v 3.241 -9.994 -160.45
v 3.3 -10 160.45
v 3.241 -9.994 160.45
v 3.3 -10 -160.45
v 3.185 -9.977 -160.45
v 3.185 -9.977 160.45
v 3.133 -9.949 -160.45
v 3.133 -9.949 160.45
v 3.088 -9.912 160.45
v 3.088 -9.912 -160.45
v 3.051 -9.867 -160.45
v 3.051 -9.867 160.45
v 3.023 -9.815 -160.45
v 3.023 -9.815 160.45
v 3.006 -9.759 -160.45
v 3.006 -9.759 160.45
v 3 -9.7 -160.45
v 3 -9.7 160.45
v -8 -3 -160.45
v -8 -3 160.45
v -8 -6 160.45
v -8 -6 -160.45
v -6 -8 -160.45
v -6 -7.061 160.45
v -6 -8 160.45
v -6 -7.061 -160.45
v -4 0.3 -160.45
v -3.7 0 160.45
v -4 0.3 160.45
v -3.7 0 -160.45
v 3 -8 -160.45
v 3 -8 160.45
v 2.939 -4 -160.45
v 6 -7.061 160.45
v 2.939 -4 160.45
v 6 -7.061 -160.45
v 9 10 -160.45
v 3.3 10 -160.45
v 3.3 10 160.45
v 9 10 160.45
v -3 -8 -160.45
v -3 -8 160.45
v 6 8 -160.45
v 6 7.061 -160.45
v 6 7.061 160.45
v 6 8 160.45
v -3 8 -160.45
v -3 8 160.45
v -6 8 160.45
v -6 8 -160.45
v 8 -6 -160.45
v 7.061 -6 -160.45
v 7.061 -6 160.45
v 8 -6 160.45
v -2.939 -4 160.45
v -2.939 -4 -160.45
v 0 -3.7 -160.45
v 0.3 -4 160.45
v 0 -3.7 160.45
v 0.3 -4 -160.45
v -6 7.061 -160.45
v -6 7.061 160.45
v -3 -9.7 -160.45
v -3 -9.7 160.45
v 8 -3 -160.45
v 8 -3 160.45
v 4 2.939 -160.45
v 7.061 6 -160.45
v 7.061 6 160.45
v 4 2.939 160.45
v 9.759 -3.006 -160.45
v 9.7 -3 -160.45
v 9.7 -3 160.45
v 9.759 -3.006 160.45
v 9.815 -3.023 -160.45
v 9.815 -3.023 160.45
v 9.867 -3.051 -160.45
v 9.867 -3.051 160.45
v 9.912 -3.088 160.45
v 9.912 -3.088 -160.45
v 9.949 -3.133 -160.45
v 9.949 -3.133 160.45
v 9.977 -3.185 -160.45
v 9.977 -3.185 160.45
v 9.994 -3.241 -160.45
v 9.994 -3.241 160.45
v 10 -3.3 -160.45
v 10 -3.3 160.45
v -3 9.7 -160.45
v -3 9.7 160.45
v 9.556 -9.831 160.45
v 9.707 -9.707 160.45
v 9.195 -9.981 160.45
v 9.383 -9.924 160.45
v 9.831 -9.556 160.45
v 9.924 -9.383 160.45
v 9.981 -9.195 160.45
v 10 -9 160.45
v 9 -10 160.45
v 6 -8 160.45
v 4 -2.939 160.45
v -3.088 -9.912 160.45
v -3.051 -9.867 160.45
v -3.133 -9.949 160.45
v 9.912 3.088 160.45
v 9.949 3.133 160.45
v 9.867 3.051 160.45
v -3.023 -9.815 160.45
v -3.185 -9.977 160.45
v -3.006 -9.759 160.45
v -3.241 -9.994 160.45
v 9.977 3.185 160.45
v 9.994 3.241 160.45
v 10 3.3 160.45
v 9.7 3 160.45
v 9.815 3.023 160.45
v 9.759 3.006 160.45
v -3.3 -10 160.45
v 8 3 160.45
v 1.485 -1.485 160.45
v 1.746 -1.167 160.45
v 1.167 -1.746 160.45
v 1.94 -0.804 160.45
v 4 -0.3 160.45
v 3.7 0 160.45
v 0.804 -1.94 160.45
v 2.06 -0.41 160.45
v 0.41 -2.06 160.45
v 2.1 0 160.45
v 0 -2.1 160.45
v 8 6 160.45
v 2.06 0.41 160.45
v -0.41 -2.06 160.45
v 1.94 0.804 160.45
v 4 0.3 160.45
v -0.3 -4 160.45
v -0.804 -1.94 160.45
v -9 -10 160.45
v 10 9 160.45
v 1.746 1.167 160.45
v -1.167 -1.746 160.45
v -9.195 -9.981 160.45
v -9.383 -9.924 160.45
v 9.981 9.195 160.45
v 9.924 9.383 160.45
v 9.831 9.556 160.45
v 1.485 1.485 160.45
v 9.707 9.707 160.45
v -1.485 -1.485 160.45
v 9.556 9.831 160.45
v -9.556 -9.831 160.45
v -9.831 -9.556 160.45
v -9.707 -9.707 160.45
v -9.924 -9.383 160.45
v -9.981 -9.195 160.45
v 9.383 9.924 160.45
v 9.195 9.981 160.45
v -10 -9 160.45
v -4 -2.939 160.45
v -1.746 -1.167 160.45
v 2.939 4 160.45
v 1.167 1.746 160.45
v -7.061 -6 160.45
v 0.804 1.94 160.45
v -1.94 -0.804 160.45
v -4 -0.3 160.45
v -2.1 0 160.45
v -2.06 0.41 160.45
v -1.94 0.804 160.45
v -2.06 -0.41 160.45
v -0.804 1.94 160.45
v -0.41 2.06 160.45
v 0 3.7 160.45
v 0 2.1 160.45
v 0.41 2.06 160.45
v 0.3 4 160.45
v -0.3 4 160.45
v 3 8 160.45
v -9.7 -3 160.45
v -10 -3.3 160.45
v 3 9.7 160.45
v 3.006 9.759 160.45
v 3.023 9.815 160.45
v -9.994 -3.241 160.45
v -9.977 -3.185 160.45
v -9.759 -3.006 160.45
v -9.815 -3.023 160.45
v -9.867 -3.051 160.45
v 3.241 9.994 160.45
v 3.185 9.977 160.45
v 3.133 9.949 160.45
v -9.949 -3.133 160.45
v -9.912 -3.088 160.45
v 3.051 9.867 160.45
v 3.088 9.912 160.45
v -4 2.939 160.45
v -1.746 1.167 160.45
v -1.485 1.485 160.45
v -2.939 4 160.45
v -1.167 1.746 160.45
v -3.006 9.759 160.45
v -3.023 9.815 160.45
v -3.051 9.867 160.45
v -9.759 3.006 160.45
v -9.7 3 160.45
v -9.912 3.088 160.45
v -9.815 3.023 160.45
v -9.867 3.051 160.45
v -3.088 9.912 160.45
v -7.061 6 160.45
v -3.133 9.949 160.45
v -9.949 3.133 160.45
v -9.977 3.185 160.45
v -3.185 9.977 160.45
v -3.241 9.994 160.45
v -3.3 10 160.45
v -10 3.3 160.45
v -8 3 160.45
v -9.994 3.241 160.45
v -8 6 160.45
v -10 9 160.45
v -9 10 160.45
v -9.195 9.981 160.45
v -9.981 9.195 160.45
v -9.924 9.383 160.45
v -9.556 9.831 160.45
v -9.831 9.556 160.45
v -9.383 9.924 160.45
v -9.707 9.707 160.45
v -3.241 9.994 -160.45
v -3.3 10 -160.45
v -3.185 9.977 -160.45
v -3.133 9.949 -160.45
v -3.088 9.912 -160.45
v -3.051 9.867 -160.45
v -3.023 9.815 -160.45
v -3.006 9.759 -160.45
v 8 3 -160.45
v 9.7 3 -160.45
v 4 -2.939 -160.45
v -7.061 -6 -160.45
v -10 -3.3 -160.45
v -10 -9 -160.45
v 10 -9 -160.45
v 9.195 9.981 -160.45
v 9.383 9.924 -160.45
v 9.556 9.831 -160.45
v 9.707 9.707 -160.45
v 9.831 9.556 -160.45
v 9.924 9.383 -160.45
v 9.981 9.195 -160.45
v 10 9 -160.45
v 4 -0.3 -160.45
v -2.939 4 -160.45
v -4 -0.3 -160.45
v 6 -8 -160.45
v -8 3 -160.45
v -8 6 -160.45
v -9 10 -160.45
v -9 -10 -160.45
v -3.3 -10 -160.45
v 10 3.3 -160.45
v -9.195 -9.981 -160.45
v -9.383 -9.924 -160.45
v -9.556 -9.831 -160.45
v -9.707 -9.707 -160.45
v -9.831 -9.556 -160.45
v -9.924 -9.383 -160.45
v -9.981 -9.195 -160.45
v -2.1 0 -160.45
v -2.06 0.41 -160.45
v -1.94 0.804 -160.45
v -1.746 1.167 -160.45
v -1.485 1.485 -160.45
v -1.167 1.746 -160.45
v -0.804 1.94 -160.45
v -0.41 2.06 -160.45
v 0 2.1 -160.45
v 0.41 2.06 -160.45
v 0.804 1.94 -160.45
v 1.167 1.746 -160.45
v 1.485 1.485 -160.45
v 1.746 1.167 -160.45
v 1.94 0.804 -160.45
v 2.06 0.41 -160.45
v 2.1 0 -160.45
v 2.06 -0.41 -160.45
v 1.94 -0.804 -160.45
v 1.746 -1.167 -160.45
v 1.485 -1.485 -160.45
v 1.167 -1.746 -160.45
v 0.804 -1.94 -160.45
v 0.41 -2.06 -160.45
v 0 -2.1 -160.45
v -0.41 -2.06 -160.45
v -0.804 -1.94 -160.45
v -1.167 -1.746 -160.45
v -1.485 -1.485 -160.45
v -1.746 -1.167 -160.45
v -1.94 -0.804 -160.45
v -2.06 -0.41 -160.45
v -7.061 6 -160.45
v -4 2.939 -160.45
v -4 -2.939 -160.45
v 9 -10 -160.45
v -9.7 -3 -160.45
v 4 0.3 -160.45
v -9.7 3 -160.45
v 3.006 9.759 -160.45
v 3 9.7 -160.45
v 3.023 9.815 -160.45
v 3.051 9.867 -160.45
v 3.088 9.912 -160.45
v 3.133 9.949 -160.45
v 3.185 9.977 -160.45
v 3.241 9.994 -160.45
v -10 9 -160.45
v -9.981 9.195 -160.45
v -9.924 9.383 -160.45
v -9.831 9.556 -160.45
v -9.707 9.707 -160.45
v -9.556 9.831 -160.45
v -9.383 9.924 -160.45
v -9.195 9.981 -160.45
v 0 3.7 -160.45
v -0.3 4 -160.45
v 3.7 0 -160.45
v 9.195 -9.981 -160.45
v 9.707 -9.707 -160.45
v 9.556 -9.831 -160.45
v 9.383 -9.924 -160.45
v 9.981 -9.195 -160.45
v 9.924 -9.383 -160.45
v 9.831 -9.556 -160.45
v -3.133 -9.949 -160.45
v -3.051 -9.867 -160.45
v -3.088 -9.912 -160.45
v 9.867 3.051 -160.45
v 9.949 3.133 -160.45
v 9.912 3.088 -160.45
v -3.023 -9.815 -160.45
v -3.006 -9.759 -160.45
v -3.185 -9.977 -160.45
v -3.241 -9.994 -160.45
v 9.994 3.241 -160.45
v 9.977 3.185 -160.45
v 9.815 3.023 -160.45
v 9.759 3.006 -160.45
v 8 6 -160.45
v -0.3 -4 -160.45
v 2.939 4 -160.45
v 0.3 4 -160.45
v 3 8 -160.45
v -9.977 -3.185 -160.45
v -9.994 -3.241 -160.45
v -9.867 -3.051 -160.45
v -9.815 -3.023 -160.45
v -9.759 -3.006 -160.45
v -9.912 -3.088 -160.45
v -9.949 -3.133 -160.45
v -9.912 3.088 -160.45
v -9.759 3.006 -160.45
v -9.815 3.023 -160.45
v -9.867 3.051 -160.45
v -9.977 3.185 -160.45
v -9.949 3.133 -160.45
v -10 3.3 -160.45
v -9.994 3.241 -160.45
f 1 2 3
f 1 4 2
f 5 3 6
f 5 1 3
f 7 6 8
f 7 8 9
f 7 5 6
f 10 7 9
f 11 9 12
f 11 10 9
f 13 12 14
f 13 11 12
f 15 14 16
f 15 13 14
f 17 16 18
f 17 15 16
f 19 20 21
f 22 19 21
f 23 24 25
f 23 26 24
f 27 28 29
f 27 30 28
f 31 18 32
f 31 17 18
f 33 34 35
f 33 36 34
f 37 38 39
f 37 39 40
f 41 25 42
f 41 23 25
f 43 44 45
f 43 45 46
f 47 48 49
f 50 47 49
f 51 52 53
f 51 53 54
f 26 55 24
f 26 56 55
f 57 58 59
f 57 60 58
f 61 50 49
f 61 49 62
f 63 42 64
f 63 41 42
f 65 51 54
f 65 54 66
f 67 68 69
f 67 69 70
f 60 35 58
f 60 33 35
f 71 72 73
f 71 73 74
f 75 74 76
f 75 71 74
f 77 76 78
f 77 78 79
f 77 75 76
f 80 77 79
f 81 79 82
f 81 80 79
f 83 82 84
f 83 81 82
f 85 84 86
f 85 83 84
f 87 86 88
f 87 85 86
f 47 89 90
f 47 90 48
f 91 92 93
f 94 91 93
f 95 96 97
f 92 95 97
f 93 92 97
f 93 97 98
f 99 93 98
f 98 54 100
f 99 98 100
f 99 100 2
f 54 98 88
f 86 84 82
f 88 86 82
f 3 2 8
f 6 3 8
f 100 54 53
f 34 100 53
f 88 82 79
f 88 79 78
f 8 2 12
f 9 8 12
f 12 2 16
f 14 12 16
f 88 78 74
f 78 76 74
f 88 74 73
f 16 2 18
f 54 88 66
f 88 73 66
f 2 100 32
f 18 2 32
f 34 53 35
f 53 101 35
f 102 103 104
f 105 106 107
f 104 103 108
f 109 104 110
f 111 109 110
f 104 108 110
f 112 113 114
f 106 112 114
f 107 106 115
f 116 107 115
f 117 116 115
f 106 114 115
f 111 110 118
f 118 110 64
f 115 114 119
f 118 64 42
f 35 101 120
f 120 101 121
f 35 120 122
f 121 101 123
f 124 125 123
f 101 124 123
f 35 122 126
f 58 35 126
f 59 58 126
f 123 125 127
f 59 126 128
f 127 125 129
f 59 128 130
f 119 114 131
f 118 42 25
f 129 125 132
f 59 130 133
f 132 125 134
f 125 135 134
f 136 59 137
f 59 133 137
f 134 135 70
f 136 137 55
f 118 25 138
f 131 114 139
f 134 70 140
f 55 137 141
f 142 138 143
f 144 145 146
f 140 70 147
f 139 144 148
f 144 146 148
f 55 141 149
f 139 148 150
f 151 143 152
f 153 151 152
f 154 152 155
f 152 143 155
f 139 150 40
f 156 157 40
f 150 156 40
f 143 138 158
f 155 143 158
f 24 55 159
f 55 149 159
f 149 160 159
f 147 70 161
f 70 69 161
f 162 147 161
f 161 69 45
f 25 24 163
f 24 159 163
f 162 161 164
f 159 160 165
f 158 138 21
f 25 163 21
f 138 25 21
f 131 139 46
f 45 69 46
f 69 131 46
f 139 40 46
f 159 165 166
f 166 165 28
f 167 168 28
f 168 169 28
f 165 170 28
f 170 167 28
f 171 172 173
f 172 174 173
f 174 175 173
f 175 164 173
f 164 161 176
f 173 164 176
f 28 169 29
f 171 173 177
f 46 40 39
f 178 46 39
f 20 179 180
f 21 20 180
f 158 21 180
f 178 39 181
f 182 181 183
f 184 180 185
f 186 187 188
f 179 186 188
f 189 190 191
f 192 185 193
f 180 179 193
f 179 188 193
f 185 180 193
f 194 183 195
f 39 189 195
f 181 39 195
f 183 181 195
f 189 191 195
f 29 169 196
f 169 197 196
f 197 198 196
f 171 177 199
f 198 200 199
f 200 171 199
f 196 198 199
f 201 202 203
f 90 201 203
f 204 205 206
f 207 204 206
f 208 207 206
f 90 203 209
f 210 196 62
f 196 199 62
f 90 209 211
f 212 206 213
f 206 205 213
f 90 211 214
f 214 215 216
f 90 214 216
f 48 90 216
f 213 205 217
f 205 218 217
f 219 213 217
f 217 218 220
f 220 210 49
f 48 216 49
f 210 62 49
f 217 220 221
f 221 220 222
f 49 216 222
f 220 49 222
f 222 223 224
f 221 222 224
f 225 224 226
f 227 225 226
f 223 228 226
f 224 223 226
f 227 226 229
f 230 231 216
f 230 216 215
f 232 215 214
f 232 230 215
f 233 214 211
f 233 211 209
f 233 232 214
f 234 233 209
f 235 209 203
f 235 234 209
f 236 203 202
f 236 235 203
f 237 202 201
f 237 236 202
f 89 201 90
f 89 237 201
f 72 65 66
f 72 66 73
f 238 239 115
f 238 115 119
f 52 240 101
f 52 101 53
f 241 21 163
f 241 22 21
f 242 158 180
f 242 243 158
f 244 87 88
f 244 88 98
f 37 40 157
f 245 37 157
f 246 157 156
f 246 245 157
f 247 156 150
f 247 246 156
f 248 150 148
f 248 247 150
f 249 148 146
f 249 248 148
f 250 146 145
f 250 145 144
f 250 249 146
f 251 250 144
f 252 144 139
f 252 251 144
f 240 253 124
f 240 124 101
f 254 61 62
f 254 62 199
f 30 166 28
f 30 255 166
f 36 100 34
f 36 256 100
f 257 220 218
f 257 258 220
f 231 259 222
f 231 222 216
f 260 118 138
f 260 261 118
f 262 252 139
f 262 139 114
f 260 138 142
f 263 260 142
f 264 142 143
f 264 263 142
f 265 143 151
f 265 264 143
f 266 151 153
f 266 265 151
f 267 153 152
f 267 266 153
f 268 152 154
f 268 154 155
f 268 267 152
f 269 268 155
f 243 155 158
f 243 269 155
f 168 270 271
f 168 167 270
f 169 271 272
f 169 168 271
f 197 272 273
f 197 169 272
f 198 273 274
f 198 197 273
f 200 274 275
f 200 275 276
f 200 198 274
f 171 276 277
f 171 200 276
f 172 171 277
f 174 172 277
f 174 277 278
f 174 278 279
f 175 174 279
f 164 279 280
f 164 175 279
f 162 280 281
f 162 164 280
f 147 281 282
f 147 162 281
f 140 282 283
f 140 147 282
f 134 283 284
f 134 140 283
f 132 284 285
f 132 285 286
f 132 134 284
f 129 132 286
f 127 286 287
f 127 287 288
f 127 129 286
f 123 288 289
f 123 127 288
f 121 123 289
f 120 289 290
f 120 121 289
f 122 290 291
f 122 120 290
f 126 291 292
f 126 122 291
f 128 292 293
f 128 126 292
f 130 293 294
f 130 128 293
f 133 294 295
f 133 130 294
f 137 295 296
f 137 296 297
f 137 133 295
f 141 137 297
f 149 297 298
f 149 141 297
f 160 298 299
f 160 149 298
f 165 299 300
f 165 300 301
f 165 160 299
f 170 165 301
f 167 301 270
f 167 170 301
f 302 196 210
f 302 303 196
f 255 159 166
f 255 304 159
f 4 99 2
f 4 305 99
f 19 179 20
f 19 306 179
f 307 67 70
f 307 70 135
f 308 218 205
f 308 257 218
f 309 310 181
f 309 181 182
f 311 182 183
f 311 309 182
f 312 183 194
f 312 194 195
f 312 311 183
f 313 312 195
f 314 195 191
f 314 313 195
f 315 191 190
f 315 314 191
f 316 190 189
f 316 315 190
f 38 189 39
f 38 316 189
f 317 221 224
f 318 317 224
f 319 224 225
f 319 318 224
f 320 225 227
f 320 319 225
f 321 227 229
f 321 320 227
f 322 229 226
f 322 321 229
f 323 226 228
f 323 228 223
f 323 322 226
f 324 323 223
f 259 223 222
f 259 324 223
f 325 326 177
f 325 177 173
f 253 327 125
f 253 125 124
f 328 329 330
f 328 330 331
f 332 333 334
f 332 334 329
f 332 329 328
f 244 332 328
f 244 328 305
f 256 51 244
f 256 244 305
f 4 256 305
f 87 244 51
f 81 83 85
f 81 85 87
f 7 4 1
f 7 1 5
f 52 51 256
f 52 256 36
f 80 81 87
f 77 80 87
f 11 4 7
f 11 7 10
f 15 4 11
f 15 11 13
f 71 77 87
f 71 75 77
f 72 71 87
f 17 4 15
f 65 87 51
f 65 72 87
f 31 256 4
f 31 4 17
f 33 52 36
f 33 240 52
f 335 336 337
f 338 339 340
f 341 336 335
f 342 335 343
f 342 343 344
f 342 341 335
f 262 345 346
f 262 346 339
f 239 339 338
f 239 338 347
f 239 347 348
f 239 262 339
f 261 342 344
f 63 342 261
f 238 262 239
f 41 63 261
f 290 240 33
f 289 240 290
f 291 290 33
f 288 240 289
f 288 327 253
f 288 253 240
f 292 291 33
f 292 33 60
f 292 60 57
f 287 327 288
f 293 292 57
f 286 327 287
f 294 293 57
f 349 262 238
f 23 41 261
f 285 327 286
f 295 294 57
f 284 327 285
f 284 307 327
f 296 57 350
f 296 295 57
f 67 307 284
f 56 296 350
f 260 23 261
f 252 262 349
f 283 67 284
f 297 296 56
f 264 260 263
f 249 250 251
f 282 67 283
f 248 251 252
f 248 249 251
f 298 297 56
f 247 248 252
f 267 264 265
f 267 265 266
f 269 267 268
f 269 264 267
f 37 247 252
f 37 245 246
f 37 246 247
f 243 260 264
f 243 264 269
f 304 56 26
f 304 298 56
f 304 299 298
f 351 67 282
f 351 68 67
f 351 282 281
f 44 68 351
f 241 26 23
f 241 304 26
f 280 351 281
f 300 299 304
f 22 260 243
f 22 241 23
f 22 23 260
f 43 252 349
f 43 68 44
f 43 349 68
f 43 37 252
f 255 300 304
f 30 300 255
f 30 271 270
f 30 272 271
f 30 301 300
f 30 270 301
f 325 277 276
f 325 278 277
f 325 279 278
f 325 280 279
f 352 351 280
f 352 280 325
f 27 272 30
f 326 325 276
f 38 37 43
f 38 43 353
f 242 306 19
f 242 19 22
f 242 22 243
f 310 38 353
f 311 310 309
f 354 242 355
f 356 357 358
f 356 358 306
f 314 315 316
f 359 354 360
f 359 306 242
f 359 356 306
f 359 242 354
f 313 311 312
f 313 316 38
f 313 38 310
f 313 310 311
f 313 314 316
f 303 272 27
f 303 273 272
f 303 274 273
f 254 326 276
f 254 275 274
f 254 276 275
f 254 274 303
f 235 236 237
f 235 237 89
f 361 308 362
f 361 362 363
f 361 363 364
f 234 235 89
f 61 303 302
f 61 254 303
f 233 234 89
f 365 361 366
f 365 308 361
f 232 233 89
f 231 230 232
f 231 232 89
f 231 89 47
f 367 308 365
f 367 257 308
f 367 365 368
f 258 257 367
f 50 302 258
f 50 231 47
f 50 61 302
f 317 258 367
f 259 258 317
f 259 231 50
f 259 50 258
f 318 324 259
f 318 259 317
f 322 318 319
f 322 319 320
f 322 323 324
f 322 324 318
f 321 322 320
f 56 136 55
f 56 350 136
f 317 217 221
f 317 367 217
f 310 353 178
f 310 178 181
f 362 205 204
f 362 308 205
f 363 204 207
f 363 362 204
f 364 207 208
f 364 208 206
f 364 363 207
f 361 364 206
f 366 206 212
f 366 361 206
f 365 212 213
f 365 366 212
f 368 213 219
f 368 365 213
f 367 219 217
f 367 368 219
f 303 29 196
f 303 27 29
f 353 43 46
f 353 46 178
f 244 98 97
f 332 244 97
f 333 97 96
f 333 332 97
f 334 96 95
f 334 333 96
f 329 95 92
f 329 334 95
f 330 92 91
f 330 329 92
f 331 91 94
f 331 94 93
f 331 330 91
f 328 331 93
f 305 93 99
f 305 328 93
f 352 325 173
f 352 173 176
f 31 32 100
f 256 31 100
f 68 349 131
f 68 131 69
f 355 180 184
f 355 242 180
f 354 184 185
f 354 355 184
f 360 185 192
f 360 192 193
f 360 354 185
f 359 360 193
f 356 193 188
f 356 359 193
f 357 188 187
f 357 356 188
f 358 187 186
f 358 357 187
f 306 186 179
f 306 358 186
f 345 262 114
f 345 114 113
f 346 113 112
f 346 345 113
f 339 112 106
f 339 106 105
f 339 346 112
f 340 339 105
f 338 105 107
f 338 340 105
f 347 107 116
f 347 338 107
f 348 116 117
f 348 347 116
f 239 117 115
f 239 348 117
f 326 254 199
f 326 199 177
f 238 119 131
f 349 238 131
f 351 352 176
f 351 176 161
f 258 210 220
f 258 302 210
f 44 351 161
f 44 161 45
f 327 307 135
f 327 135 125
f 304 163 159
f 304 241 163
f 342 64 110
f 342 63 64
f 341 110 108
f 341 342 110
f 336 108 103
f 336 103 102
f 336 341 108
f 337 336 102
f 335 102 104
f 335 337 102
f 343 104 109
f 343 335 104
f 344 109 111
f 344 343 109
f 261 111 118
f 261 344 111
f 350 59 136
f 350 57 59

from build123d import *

# Parameters (mm, degrees)
SKETCH1_R           = 2.1
BOSS_EXTRUDE1_DEPTH = 160.45


with BuildPart() as part:
    # Sketch1 → Boss-Extrude1 (new, symmetric)
    with BuildSketch(Plane(origin=(0, 0, 0), x_dir=(-1, 0, 0), z_dir=(0, 0, -1))):
        with BuildLine():
            Line((10, 3.3), (10, 9))
            ThreePointArc((10, 9), (9.707106781, 9.707106781), (9, 10))
            Line((9, 10), (3.3, 10))
            ThreePointArc((3.3, 10), (3.087867966, 9.912132034), (3, 9.7))
            Line((3, 9.7), (3, 8))
            Line((3, 8), (6, 8))
            Line((6, 8), (6, 7.060660172))
            Line((6, 7.060660172), (2.939339828, 4))
            Line((2.939339828, 4), (0.3, 4))
            Line((0.3, 4), (0, 3.7))
            Line((0, 3.7), (-0.3, 4))
            Line((-0.3, 4), (-2.939339828, 4))
            Line((-2.939339828, 4), (-6, 7.060660172))
            Line((-6, 7.060660172), (-6, 8))
            Line((-6, 8), (-3, 8))
            Line((-3, 8), (-3, 9.7))
            ThreePointArc((-3, 9.7), (-3.087867966, 9.912132034), (-3.3, 10))
            Line((-3.3, 10), (-9, 10))
            ThreePointArc((-9, 10), (-9.707106781, 9.707106781), (-10, 9))
            Line((-10, 9), (-10, 3.3))
            ThreePointArc((-10, 3.3), (-9.912132034, 3.087867966), (-9.7, 3))
            Line((-9.7, 3), (-8, 3))
            Line((-8, 3), (-8, 6))
            Line((-8, 6), (-7.060660172, 6))
            Line((-7.060660172, 6), (-4, 2.939339828))
            Line((-4, 2.939339828), (-4, 0.3))
            Line((-4, 0.3), (-3.7, 0))
            Line((-3.7, 0), (-4, -0.3))
            Line((-4, -0.3), (-4, -2.939339828))
            Line((-4, -2.939339828), (-7.060660172, -6))
            Line((-7.060660172, -6), (-8, -6))
            Line((-8, -6), (-8, -3))
            Line((-8, -3), (-9.7, -3))
            ThreePointArc((-9.7, -3), (-9.912132034, -3.087867966), (-10, -3.3))
            Line((-10, -3.3), (-10, -9))
            ThreePointArc((-10, -9), (-9.707106781, -9.707106781), (-9, -10))
            Line((-9, -10), (-3.3, -10))
            ThreePointArc((-3.3, -10), (-3.087867966, -9.912132034), (-3, -9.7))
            Line((-3, -9.7), (-3, -8))
            Line((-3, -8), (-6, -8))
            Line((-6, -8), (-6, -7.060660172))
            Line((-6, -7.060660172), (-2.939339828, -4))
            Line((-2.939339828, -4), (-0.3, -4))
            Line((-0.3, -4), (0, -3.7))
            Line((0, -3.7), (0.3, -4))
            Line((0.3, -4), (2.939339828, -4))
            Line((2.939339828, -4), (6, -7.060660172))
            Line((6, -7.060660172), (6, -8))
            Line((6, -8), (3, -8))
            Line((3, -8), (3, -9.7))
            ThreePointArc((3, -9.7), (3.087867966, -9.912132034), (3.3, -10))
            Line((3.3, -10), (9, -10))
            ThreePointArc((9, -10), (9.707106781, -9.707106781), (10, -9))
            Line((10, -9), (10, -3.3))
            ThreePointArc((10, -3.3), (9.912132034, -3.087867966), (9.7, -3))
            Line((9.7, -3), (8, -3))
            Line((8, -3), (8, -6))
            Line((8, -6), (7.060660172, -6))
            Line((7.060660172, -6), (4, -2.939339828))
            Line((4, -2.939339828), (4, -0.3))
            Line((4, -0.3), (3.7, 0))
            Line((3.7, 0), (4, 0.3))
            Line((4, 0.3), (4, 2.939339828))
            Line((4, 2.939339828), (7.060660172, 6))
            Line((7.060660172, 6), (8, 6))
            Line((8, 6), (8, 3))
            Line((8, 3), (9.7, 3))
            ThreePointArc((9.7, 3), (9.912132034, 3.087867966), (10, 3.3))
        make_face()
        Circle(SKETCH1_R, mode=Mode.SUBTRACT)
    extrude(amount=BOSS_EXTRUDE1_DEPTH, both=True)


solid = part.part
